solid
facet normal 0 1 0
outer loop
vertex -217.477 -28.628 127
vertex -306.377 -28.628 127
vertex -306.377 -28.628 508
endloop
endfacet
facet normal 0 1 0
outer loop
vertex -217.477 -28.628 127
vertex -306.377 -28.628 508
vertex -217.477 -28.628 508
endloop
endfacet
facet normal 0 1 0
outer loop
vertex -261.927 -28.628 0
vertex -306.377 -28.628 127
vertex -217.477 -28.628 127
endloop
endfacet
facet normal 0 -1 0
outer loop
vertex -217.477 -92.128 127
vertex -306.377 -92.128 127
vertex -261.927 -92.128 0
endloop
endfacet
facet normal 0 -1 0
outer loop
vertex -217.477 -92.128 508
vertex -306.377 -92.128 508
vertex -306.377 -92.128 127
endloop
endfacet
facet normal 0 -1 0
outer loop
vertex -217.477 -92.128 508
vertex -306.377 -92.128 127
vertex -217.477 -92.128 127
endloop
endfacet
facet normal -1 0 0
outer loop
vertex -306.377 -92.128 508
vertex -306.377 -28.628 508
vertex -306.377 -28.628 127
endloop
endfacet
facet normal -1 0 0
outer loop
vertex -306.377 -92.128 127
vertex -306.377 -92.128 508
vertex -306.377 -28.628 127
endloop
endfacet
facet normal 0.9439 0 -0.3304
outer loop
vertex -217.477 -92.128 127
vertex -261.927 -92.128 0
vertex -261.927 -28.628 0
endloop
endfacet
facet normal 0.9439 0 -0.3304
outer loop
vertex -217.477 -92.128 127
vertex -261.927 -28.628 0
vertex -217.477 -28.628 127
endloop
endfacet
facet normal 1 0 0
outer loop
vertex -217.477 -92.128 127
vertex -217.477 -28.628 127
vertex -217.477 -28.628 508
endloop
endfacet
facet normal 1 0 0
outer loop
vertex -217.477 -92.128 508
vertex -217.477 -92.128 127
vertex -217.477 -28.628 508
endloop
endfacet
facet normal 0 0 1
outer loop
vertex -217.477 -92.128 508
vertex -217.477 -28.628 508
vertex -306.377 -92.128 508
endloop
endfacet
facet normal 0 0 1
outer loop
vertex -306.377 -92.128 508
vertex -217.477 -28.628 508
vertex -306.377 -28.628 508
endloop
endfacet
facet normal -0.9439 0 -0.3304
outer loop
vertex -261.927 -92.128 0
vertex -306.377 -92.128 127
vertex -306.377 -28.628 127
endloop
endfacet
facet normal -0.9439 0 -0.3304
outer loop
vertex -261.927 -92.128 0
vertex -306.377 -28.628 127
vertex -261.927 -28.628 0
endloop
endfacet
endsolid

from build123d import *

# Parameters (mm, degrees)
F0_W     = 88.9
F0_H     = 38.1000016469
F1_DEPTH = 508
F3_DEPTH = 25.4
F4_DEPTH = 38.1010016469


with BuildPart() as f1:
    # F0 (on Top) → F1 (new body)
    with BuildSketch(Plane.XY):
        with Locations((-261.9274258614, -47.6780477911)):
            Rectangle(F0_W, F0_H)
    extrude(amount=F1_DEPTH)

    # F2 (on face) → F3 (join)
    with BuildSketch(Plane.XZ.offset(66.7280486146)):
        Polygon((-306.3774258614, 508), (-306.3774258614, 127), (-261.9274258614, 0), (-217.4774258614, 127), (-217.4774258614, 508), align=None)
    extrude(amount=F3_DEPTH)

    # F4 (cut, through all): faces of the model
    f4_faces = [f1.faces().sort_by_distance(p)[0] for p in [
        (-291.5607591947, -66.7280486146, 42.3333333333),
        (-232.294092528, -66.7280486146, 42.3333333333),
    ]]
    extrude(f4_faces, amount=-F4_DEPTH, mode=Mode.SUBTRACT)


solid = f1.part
